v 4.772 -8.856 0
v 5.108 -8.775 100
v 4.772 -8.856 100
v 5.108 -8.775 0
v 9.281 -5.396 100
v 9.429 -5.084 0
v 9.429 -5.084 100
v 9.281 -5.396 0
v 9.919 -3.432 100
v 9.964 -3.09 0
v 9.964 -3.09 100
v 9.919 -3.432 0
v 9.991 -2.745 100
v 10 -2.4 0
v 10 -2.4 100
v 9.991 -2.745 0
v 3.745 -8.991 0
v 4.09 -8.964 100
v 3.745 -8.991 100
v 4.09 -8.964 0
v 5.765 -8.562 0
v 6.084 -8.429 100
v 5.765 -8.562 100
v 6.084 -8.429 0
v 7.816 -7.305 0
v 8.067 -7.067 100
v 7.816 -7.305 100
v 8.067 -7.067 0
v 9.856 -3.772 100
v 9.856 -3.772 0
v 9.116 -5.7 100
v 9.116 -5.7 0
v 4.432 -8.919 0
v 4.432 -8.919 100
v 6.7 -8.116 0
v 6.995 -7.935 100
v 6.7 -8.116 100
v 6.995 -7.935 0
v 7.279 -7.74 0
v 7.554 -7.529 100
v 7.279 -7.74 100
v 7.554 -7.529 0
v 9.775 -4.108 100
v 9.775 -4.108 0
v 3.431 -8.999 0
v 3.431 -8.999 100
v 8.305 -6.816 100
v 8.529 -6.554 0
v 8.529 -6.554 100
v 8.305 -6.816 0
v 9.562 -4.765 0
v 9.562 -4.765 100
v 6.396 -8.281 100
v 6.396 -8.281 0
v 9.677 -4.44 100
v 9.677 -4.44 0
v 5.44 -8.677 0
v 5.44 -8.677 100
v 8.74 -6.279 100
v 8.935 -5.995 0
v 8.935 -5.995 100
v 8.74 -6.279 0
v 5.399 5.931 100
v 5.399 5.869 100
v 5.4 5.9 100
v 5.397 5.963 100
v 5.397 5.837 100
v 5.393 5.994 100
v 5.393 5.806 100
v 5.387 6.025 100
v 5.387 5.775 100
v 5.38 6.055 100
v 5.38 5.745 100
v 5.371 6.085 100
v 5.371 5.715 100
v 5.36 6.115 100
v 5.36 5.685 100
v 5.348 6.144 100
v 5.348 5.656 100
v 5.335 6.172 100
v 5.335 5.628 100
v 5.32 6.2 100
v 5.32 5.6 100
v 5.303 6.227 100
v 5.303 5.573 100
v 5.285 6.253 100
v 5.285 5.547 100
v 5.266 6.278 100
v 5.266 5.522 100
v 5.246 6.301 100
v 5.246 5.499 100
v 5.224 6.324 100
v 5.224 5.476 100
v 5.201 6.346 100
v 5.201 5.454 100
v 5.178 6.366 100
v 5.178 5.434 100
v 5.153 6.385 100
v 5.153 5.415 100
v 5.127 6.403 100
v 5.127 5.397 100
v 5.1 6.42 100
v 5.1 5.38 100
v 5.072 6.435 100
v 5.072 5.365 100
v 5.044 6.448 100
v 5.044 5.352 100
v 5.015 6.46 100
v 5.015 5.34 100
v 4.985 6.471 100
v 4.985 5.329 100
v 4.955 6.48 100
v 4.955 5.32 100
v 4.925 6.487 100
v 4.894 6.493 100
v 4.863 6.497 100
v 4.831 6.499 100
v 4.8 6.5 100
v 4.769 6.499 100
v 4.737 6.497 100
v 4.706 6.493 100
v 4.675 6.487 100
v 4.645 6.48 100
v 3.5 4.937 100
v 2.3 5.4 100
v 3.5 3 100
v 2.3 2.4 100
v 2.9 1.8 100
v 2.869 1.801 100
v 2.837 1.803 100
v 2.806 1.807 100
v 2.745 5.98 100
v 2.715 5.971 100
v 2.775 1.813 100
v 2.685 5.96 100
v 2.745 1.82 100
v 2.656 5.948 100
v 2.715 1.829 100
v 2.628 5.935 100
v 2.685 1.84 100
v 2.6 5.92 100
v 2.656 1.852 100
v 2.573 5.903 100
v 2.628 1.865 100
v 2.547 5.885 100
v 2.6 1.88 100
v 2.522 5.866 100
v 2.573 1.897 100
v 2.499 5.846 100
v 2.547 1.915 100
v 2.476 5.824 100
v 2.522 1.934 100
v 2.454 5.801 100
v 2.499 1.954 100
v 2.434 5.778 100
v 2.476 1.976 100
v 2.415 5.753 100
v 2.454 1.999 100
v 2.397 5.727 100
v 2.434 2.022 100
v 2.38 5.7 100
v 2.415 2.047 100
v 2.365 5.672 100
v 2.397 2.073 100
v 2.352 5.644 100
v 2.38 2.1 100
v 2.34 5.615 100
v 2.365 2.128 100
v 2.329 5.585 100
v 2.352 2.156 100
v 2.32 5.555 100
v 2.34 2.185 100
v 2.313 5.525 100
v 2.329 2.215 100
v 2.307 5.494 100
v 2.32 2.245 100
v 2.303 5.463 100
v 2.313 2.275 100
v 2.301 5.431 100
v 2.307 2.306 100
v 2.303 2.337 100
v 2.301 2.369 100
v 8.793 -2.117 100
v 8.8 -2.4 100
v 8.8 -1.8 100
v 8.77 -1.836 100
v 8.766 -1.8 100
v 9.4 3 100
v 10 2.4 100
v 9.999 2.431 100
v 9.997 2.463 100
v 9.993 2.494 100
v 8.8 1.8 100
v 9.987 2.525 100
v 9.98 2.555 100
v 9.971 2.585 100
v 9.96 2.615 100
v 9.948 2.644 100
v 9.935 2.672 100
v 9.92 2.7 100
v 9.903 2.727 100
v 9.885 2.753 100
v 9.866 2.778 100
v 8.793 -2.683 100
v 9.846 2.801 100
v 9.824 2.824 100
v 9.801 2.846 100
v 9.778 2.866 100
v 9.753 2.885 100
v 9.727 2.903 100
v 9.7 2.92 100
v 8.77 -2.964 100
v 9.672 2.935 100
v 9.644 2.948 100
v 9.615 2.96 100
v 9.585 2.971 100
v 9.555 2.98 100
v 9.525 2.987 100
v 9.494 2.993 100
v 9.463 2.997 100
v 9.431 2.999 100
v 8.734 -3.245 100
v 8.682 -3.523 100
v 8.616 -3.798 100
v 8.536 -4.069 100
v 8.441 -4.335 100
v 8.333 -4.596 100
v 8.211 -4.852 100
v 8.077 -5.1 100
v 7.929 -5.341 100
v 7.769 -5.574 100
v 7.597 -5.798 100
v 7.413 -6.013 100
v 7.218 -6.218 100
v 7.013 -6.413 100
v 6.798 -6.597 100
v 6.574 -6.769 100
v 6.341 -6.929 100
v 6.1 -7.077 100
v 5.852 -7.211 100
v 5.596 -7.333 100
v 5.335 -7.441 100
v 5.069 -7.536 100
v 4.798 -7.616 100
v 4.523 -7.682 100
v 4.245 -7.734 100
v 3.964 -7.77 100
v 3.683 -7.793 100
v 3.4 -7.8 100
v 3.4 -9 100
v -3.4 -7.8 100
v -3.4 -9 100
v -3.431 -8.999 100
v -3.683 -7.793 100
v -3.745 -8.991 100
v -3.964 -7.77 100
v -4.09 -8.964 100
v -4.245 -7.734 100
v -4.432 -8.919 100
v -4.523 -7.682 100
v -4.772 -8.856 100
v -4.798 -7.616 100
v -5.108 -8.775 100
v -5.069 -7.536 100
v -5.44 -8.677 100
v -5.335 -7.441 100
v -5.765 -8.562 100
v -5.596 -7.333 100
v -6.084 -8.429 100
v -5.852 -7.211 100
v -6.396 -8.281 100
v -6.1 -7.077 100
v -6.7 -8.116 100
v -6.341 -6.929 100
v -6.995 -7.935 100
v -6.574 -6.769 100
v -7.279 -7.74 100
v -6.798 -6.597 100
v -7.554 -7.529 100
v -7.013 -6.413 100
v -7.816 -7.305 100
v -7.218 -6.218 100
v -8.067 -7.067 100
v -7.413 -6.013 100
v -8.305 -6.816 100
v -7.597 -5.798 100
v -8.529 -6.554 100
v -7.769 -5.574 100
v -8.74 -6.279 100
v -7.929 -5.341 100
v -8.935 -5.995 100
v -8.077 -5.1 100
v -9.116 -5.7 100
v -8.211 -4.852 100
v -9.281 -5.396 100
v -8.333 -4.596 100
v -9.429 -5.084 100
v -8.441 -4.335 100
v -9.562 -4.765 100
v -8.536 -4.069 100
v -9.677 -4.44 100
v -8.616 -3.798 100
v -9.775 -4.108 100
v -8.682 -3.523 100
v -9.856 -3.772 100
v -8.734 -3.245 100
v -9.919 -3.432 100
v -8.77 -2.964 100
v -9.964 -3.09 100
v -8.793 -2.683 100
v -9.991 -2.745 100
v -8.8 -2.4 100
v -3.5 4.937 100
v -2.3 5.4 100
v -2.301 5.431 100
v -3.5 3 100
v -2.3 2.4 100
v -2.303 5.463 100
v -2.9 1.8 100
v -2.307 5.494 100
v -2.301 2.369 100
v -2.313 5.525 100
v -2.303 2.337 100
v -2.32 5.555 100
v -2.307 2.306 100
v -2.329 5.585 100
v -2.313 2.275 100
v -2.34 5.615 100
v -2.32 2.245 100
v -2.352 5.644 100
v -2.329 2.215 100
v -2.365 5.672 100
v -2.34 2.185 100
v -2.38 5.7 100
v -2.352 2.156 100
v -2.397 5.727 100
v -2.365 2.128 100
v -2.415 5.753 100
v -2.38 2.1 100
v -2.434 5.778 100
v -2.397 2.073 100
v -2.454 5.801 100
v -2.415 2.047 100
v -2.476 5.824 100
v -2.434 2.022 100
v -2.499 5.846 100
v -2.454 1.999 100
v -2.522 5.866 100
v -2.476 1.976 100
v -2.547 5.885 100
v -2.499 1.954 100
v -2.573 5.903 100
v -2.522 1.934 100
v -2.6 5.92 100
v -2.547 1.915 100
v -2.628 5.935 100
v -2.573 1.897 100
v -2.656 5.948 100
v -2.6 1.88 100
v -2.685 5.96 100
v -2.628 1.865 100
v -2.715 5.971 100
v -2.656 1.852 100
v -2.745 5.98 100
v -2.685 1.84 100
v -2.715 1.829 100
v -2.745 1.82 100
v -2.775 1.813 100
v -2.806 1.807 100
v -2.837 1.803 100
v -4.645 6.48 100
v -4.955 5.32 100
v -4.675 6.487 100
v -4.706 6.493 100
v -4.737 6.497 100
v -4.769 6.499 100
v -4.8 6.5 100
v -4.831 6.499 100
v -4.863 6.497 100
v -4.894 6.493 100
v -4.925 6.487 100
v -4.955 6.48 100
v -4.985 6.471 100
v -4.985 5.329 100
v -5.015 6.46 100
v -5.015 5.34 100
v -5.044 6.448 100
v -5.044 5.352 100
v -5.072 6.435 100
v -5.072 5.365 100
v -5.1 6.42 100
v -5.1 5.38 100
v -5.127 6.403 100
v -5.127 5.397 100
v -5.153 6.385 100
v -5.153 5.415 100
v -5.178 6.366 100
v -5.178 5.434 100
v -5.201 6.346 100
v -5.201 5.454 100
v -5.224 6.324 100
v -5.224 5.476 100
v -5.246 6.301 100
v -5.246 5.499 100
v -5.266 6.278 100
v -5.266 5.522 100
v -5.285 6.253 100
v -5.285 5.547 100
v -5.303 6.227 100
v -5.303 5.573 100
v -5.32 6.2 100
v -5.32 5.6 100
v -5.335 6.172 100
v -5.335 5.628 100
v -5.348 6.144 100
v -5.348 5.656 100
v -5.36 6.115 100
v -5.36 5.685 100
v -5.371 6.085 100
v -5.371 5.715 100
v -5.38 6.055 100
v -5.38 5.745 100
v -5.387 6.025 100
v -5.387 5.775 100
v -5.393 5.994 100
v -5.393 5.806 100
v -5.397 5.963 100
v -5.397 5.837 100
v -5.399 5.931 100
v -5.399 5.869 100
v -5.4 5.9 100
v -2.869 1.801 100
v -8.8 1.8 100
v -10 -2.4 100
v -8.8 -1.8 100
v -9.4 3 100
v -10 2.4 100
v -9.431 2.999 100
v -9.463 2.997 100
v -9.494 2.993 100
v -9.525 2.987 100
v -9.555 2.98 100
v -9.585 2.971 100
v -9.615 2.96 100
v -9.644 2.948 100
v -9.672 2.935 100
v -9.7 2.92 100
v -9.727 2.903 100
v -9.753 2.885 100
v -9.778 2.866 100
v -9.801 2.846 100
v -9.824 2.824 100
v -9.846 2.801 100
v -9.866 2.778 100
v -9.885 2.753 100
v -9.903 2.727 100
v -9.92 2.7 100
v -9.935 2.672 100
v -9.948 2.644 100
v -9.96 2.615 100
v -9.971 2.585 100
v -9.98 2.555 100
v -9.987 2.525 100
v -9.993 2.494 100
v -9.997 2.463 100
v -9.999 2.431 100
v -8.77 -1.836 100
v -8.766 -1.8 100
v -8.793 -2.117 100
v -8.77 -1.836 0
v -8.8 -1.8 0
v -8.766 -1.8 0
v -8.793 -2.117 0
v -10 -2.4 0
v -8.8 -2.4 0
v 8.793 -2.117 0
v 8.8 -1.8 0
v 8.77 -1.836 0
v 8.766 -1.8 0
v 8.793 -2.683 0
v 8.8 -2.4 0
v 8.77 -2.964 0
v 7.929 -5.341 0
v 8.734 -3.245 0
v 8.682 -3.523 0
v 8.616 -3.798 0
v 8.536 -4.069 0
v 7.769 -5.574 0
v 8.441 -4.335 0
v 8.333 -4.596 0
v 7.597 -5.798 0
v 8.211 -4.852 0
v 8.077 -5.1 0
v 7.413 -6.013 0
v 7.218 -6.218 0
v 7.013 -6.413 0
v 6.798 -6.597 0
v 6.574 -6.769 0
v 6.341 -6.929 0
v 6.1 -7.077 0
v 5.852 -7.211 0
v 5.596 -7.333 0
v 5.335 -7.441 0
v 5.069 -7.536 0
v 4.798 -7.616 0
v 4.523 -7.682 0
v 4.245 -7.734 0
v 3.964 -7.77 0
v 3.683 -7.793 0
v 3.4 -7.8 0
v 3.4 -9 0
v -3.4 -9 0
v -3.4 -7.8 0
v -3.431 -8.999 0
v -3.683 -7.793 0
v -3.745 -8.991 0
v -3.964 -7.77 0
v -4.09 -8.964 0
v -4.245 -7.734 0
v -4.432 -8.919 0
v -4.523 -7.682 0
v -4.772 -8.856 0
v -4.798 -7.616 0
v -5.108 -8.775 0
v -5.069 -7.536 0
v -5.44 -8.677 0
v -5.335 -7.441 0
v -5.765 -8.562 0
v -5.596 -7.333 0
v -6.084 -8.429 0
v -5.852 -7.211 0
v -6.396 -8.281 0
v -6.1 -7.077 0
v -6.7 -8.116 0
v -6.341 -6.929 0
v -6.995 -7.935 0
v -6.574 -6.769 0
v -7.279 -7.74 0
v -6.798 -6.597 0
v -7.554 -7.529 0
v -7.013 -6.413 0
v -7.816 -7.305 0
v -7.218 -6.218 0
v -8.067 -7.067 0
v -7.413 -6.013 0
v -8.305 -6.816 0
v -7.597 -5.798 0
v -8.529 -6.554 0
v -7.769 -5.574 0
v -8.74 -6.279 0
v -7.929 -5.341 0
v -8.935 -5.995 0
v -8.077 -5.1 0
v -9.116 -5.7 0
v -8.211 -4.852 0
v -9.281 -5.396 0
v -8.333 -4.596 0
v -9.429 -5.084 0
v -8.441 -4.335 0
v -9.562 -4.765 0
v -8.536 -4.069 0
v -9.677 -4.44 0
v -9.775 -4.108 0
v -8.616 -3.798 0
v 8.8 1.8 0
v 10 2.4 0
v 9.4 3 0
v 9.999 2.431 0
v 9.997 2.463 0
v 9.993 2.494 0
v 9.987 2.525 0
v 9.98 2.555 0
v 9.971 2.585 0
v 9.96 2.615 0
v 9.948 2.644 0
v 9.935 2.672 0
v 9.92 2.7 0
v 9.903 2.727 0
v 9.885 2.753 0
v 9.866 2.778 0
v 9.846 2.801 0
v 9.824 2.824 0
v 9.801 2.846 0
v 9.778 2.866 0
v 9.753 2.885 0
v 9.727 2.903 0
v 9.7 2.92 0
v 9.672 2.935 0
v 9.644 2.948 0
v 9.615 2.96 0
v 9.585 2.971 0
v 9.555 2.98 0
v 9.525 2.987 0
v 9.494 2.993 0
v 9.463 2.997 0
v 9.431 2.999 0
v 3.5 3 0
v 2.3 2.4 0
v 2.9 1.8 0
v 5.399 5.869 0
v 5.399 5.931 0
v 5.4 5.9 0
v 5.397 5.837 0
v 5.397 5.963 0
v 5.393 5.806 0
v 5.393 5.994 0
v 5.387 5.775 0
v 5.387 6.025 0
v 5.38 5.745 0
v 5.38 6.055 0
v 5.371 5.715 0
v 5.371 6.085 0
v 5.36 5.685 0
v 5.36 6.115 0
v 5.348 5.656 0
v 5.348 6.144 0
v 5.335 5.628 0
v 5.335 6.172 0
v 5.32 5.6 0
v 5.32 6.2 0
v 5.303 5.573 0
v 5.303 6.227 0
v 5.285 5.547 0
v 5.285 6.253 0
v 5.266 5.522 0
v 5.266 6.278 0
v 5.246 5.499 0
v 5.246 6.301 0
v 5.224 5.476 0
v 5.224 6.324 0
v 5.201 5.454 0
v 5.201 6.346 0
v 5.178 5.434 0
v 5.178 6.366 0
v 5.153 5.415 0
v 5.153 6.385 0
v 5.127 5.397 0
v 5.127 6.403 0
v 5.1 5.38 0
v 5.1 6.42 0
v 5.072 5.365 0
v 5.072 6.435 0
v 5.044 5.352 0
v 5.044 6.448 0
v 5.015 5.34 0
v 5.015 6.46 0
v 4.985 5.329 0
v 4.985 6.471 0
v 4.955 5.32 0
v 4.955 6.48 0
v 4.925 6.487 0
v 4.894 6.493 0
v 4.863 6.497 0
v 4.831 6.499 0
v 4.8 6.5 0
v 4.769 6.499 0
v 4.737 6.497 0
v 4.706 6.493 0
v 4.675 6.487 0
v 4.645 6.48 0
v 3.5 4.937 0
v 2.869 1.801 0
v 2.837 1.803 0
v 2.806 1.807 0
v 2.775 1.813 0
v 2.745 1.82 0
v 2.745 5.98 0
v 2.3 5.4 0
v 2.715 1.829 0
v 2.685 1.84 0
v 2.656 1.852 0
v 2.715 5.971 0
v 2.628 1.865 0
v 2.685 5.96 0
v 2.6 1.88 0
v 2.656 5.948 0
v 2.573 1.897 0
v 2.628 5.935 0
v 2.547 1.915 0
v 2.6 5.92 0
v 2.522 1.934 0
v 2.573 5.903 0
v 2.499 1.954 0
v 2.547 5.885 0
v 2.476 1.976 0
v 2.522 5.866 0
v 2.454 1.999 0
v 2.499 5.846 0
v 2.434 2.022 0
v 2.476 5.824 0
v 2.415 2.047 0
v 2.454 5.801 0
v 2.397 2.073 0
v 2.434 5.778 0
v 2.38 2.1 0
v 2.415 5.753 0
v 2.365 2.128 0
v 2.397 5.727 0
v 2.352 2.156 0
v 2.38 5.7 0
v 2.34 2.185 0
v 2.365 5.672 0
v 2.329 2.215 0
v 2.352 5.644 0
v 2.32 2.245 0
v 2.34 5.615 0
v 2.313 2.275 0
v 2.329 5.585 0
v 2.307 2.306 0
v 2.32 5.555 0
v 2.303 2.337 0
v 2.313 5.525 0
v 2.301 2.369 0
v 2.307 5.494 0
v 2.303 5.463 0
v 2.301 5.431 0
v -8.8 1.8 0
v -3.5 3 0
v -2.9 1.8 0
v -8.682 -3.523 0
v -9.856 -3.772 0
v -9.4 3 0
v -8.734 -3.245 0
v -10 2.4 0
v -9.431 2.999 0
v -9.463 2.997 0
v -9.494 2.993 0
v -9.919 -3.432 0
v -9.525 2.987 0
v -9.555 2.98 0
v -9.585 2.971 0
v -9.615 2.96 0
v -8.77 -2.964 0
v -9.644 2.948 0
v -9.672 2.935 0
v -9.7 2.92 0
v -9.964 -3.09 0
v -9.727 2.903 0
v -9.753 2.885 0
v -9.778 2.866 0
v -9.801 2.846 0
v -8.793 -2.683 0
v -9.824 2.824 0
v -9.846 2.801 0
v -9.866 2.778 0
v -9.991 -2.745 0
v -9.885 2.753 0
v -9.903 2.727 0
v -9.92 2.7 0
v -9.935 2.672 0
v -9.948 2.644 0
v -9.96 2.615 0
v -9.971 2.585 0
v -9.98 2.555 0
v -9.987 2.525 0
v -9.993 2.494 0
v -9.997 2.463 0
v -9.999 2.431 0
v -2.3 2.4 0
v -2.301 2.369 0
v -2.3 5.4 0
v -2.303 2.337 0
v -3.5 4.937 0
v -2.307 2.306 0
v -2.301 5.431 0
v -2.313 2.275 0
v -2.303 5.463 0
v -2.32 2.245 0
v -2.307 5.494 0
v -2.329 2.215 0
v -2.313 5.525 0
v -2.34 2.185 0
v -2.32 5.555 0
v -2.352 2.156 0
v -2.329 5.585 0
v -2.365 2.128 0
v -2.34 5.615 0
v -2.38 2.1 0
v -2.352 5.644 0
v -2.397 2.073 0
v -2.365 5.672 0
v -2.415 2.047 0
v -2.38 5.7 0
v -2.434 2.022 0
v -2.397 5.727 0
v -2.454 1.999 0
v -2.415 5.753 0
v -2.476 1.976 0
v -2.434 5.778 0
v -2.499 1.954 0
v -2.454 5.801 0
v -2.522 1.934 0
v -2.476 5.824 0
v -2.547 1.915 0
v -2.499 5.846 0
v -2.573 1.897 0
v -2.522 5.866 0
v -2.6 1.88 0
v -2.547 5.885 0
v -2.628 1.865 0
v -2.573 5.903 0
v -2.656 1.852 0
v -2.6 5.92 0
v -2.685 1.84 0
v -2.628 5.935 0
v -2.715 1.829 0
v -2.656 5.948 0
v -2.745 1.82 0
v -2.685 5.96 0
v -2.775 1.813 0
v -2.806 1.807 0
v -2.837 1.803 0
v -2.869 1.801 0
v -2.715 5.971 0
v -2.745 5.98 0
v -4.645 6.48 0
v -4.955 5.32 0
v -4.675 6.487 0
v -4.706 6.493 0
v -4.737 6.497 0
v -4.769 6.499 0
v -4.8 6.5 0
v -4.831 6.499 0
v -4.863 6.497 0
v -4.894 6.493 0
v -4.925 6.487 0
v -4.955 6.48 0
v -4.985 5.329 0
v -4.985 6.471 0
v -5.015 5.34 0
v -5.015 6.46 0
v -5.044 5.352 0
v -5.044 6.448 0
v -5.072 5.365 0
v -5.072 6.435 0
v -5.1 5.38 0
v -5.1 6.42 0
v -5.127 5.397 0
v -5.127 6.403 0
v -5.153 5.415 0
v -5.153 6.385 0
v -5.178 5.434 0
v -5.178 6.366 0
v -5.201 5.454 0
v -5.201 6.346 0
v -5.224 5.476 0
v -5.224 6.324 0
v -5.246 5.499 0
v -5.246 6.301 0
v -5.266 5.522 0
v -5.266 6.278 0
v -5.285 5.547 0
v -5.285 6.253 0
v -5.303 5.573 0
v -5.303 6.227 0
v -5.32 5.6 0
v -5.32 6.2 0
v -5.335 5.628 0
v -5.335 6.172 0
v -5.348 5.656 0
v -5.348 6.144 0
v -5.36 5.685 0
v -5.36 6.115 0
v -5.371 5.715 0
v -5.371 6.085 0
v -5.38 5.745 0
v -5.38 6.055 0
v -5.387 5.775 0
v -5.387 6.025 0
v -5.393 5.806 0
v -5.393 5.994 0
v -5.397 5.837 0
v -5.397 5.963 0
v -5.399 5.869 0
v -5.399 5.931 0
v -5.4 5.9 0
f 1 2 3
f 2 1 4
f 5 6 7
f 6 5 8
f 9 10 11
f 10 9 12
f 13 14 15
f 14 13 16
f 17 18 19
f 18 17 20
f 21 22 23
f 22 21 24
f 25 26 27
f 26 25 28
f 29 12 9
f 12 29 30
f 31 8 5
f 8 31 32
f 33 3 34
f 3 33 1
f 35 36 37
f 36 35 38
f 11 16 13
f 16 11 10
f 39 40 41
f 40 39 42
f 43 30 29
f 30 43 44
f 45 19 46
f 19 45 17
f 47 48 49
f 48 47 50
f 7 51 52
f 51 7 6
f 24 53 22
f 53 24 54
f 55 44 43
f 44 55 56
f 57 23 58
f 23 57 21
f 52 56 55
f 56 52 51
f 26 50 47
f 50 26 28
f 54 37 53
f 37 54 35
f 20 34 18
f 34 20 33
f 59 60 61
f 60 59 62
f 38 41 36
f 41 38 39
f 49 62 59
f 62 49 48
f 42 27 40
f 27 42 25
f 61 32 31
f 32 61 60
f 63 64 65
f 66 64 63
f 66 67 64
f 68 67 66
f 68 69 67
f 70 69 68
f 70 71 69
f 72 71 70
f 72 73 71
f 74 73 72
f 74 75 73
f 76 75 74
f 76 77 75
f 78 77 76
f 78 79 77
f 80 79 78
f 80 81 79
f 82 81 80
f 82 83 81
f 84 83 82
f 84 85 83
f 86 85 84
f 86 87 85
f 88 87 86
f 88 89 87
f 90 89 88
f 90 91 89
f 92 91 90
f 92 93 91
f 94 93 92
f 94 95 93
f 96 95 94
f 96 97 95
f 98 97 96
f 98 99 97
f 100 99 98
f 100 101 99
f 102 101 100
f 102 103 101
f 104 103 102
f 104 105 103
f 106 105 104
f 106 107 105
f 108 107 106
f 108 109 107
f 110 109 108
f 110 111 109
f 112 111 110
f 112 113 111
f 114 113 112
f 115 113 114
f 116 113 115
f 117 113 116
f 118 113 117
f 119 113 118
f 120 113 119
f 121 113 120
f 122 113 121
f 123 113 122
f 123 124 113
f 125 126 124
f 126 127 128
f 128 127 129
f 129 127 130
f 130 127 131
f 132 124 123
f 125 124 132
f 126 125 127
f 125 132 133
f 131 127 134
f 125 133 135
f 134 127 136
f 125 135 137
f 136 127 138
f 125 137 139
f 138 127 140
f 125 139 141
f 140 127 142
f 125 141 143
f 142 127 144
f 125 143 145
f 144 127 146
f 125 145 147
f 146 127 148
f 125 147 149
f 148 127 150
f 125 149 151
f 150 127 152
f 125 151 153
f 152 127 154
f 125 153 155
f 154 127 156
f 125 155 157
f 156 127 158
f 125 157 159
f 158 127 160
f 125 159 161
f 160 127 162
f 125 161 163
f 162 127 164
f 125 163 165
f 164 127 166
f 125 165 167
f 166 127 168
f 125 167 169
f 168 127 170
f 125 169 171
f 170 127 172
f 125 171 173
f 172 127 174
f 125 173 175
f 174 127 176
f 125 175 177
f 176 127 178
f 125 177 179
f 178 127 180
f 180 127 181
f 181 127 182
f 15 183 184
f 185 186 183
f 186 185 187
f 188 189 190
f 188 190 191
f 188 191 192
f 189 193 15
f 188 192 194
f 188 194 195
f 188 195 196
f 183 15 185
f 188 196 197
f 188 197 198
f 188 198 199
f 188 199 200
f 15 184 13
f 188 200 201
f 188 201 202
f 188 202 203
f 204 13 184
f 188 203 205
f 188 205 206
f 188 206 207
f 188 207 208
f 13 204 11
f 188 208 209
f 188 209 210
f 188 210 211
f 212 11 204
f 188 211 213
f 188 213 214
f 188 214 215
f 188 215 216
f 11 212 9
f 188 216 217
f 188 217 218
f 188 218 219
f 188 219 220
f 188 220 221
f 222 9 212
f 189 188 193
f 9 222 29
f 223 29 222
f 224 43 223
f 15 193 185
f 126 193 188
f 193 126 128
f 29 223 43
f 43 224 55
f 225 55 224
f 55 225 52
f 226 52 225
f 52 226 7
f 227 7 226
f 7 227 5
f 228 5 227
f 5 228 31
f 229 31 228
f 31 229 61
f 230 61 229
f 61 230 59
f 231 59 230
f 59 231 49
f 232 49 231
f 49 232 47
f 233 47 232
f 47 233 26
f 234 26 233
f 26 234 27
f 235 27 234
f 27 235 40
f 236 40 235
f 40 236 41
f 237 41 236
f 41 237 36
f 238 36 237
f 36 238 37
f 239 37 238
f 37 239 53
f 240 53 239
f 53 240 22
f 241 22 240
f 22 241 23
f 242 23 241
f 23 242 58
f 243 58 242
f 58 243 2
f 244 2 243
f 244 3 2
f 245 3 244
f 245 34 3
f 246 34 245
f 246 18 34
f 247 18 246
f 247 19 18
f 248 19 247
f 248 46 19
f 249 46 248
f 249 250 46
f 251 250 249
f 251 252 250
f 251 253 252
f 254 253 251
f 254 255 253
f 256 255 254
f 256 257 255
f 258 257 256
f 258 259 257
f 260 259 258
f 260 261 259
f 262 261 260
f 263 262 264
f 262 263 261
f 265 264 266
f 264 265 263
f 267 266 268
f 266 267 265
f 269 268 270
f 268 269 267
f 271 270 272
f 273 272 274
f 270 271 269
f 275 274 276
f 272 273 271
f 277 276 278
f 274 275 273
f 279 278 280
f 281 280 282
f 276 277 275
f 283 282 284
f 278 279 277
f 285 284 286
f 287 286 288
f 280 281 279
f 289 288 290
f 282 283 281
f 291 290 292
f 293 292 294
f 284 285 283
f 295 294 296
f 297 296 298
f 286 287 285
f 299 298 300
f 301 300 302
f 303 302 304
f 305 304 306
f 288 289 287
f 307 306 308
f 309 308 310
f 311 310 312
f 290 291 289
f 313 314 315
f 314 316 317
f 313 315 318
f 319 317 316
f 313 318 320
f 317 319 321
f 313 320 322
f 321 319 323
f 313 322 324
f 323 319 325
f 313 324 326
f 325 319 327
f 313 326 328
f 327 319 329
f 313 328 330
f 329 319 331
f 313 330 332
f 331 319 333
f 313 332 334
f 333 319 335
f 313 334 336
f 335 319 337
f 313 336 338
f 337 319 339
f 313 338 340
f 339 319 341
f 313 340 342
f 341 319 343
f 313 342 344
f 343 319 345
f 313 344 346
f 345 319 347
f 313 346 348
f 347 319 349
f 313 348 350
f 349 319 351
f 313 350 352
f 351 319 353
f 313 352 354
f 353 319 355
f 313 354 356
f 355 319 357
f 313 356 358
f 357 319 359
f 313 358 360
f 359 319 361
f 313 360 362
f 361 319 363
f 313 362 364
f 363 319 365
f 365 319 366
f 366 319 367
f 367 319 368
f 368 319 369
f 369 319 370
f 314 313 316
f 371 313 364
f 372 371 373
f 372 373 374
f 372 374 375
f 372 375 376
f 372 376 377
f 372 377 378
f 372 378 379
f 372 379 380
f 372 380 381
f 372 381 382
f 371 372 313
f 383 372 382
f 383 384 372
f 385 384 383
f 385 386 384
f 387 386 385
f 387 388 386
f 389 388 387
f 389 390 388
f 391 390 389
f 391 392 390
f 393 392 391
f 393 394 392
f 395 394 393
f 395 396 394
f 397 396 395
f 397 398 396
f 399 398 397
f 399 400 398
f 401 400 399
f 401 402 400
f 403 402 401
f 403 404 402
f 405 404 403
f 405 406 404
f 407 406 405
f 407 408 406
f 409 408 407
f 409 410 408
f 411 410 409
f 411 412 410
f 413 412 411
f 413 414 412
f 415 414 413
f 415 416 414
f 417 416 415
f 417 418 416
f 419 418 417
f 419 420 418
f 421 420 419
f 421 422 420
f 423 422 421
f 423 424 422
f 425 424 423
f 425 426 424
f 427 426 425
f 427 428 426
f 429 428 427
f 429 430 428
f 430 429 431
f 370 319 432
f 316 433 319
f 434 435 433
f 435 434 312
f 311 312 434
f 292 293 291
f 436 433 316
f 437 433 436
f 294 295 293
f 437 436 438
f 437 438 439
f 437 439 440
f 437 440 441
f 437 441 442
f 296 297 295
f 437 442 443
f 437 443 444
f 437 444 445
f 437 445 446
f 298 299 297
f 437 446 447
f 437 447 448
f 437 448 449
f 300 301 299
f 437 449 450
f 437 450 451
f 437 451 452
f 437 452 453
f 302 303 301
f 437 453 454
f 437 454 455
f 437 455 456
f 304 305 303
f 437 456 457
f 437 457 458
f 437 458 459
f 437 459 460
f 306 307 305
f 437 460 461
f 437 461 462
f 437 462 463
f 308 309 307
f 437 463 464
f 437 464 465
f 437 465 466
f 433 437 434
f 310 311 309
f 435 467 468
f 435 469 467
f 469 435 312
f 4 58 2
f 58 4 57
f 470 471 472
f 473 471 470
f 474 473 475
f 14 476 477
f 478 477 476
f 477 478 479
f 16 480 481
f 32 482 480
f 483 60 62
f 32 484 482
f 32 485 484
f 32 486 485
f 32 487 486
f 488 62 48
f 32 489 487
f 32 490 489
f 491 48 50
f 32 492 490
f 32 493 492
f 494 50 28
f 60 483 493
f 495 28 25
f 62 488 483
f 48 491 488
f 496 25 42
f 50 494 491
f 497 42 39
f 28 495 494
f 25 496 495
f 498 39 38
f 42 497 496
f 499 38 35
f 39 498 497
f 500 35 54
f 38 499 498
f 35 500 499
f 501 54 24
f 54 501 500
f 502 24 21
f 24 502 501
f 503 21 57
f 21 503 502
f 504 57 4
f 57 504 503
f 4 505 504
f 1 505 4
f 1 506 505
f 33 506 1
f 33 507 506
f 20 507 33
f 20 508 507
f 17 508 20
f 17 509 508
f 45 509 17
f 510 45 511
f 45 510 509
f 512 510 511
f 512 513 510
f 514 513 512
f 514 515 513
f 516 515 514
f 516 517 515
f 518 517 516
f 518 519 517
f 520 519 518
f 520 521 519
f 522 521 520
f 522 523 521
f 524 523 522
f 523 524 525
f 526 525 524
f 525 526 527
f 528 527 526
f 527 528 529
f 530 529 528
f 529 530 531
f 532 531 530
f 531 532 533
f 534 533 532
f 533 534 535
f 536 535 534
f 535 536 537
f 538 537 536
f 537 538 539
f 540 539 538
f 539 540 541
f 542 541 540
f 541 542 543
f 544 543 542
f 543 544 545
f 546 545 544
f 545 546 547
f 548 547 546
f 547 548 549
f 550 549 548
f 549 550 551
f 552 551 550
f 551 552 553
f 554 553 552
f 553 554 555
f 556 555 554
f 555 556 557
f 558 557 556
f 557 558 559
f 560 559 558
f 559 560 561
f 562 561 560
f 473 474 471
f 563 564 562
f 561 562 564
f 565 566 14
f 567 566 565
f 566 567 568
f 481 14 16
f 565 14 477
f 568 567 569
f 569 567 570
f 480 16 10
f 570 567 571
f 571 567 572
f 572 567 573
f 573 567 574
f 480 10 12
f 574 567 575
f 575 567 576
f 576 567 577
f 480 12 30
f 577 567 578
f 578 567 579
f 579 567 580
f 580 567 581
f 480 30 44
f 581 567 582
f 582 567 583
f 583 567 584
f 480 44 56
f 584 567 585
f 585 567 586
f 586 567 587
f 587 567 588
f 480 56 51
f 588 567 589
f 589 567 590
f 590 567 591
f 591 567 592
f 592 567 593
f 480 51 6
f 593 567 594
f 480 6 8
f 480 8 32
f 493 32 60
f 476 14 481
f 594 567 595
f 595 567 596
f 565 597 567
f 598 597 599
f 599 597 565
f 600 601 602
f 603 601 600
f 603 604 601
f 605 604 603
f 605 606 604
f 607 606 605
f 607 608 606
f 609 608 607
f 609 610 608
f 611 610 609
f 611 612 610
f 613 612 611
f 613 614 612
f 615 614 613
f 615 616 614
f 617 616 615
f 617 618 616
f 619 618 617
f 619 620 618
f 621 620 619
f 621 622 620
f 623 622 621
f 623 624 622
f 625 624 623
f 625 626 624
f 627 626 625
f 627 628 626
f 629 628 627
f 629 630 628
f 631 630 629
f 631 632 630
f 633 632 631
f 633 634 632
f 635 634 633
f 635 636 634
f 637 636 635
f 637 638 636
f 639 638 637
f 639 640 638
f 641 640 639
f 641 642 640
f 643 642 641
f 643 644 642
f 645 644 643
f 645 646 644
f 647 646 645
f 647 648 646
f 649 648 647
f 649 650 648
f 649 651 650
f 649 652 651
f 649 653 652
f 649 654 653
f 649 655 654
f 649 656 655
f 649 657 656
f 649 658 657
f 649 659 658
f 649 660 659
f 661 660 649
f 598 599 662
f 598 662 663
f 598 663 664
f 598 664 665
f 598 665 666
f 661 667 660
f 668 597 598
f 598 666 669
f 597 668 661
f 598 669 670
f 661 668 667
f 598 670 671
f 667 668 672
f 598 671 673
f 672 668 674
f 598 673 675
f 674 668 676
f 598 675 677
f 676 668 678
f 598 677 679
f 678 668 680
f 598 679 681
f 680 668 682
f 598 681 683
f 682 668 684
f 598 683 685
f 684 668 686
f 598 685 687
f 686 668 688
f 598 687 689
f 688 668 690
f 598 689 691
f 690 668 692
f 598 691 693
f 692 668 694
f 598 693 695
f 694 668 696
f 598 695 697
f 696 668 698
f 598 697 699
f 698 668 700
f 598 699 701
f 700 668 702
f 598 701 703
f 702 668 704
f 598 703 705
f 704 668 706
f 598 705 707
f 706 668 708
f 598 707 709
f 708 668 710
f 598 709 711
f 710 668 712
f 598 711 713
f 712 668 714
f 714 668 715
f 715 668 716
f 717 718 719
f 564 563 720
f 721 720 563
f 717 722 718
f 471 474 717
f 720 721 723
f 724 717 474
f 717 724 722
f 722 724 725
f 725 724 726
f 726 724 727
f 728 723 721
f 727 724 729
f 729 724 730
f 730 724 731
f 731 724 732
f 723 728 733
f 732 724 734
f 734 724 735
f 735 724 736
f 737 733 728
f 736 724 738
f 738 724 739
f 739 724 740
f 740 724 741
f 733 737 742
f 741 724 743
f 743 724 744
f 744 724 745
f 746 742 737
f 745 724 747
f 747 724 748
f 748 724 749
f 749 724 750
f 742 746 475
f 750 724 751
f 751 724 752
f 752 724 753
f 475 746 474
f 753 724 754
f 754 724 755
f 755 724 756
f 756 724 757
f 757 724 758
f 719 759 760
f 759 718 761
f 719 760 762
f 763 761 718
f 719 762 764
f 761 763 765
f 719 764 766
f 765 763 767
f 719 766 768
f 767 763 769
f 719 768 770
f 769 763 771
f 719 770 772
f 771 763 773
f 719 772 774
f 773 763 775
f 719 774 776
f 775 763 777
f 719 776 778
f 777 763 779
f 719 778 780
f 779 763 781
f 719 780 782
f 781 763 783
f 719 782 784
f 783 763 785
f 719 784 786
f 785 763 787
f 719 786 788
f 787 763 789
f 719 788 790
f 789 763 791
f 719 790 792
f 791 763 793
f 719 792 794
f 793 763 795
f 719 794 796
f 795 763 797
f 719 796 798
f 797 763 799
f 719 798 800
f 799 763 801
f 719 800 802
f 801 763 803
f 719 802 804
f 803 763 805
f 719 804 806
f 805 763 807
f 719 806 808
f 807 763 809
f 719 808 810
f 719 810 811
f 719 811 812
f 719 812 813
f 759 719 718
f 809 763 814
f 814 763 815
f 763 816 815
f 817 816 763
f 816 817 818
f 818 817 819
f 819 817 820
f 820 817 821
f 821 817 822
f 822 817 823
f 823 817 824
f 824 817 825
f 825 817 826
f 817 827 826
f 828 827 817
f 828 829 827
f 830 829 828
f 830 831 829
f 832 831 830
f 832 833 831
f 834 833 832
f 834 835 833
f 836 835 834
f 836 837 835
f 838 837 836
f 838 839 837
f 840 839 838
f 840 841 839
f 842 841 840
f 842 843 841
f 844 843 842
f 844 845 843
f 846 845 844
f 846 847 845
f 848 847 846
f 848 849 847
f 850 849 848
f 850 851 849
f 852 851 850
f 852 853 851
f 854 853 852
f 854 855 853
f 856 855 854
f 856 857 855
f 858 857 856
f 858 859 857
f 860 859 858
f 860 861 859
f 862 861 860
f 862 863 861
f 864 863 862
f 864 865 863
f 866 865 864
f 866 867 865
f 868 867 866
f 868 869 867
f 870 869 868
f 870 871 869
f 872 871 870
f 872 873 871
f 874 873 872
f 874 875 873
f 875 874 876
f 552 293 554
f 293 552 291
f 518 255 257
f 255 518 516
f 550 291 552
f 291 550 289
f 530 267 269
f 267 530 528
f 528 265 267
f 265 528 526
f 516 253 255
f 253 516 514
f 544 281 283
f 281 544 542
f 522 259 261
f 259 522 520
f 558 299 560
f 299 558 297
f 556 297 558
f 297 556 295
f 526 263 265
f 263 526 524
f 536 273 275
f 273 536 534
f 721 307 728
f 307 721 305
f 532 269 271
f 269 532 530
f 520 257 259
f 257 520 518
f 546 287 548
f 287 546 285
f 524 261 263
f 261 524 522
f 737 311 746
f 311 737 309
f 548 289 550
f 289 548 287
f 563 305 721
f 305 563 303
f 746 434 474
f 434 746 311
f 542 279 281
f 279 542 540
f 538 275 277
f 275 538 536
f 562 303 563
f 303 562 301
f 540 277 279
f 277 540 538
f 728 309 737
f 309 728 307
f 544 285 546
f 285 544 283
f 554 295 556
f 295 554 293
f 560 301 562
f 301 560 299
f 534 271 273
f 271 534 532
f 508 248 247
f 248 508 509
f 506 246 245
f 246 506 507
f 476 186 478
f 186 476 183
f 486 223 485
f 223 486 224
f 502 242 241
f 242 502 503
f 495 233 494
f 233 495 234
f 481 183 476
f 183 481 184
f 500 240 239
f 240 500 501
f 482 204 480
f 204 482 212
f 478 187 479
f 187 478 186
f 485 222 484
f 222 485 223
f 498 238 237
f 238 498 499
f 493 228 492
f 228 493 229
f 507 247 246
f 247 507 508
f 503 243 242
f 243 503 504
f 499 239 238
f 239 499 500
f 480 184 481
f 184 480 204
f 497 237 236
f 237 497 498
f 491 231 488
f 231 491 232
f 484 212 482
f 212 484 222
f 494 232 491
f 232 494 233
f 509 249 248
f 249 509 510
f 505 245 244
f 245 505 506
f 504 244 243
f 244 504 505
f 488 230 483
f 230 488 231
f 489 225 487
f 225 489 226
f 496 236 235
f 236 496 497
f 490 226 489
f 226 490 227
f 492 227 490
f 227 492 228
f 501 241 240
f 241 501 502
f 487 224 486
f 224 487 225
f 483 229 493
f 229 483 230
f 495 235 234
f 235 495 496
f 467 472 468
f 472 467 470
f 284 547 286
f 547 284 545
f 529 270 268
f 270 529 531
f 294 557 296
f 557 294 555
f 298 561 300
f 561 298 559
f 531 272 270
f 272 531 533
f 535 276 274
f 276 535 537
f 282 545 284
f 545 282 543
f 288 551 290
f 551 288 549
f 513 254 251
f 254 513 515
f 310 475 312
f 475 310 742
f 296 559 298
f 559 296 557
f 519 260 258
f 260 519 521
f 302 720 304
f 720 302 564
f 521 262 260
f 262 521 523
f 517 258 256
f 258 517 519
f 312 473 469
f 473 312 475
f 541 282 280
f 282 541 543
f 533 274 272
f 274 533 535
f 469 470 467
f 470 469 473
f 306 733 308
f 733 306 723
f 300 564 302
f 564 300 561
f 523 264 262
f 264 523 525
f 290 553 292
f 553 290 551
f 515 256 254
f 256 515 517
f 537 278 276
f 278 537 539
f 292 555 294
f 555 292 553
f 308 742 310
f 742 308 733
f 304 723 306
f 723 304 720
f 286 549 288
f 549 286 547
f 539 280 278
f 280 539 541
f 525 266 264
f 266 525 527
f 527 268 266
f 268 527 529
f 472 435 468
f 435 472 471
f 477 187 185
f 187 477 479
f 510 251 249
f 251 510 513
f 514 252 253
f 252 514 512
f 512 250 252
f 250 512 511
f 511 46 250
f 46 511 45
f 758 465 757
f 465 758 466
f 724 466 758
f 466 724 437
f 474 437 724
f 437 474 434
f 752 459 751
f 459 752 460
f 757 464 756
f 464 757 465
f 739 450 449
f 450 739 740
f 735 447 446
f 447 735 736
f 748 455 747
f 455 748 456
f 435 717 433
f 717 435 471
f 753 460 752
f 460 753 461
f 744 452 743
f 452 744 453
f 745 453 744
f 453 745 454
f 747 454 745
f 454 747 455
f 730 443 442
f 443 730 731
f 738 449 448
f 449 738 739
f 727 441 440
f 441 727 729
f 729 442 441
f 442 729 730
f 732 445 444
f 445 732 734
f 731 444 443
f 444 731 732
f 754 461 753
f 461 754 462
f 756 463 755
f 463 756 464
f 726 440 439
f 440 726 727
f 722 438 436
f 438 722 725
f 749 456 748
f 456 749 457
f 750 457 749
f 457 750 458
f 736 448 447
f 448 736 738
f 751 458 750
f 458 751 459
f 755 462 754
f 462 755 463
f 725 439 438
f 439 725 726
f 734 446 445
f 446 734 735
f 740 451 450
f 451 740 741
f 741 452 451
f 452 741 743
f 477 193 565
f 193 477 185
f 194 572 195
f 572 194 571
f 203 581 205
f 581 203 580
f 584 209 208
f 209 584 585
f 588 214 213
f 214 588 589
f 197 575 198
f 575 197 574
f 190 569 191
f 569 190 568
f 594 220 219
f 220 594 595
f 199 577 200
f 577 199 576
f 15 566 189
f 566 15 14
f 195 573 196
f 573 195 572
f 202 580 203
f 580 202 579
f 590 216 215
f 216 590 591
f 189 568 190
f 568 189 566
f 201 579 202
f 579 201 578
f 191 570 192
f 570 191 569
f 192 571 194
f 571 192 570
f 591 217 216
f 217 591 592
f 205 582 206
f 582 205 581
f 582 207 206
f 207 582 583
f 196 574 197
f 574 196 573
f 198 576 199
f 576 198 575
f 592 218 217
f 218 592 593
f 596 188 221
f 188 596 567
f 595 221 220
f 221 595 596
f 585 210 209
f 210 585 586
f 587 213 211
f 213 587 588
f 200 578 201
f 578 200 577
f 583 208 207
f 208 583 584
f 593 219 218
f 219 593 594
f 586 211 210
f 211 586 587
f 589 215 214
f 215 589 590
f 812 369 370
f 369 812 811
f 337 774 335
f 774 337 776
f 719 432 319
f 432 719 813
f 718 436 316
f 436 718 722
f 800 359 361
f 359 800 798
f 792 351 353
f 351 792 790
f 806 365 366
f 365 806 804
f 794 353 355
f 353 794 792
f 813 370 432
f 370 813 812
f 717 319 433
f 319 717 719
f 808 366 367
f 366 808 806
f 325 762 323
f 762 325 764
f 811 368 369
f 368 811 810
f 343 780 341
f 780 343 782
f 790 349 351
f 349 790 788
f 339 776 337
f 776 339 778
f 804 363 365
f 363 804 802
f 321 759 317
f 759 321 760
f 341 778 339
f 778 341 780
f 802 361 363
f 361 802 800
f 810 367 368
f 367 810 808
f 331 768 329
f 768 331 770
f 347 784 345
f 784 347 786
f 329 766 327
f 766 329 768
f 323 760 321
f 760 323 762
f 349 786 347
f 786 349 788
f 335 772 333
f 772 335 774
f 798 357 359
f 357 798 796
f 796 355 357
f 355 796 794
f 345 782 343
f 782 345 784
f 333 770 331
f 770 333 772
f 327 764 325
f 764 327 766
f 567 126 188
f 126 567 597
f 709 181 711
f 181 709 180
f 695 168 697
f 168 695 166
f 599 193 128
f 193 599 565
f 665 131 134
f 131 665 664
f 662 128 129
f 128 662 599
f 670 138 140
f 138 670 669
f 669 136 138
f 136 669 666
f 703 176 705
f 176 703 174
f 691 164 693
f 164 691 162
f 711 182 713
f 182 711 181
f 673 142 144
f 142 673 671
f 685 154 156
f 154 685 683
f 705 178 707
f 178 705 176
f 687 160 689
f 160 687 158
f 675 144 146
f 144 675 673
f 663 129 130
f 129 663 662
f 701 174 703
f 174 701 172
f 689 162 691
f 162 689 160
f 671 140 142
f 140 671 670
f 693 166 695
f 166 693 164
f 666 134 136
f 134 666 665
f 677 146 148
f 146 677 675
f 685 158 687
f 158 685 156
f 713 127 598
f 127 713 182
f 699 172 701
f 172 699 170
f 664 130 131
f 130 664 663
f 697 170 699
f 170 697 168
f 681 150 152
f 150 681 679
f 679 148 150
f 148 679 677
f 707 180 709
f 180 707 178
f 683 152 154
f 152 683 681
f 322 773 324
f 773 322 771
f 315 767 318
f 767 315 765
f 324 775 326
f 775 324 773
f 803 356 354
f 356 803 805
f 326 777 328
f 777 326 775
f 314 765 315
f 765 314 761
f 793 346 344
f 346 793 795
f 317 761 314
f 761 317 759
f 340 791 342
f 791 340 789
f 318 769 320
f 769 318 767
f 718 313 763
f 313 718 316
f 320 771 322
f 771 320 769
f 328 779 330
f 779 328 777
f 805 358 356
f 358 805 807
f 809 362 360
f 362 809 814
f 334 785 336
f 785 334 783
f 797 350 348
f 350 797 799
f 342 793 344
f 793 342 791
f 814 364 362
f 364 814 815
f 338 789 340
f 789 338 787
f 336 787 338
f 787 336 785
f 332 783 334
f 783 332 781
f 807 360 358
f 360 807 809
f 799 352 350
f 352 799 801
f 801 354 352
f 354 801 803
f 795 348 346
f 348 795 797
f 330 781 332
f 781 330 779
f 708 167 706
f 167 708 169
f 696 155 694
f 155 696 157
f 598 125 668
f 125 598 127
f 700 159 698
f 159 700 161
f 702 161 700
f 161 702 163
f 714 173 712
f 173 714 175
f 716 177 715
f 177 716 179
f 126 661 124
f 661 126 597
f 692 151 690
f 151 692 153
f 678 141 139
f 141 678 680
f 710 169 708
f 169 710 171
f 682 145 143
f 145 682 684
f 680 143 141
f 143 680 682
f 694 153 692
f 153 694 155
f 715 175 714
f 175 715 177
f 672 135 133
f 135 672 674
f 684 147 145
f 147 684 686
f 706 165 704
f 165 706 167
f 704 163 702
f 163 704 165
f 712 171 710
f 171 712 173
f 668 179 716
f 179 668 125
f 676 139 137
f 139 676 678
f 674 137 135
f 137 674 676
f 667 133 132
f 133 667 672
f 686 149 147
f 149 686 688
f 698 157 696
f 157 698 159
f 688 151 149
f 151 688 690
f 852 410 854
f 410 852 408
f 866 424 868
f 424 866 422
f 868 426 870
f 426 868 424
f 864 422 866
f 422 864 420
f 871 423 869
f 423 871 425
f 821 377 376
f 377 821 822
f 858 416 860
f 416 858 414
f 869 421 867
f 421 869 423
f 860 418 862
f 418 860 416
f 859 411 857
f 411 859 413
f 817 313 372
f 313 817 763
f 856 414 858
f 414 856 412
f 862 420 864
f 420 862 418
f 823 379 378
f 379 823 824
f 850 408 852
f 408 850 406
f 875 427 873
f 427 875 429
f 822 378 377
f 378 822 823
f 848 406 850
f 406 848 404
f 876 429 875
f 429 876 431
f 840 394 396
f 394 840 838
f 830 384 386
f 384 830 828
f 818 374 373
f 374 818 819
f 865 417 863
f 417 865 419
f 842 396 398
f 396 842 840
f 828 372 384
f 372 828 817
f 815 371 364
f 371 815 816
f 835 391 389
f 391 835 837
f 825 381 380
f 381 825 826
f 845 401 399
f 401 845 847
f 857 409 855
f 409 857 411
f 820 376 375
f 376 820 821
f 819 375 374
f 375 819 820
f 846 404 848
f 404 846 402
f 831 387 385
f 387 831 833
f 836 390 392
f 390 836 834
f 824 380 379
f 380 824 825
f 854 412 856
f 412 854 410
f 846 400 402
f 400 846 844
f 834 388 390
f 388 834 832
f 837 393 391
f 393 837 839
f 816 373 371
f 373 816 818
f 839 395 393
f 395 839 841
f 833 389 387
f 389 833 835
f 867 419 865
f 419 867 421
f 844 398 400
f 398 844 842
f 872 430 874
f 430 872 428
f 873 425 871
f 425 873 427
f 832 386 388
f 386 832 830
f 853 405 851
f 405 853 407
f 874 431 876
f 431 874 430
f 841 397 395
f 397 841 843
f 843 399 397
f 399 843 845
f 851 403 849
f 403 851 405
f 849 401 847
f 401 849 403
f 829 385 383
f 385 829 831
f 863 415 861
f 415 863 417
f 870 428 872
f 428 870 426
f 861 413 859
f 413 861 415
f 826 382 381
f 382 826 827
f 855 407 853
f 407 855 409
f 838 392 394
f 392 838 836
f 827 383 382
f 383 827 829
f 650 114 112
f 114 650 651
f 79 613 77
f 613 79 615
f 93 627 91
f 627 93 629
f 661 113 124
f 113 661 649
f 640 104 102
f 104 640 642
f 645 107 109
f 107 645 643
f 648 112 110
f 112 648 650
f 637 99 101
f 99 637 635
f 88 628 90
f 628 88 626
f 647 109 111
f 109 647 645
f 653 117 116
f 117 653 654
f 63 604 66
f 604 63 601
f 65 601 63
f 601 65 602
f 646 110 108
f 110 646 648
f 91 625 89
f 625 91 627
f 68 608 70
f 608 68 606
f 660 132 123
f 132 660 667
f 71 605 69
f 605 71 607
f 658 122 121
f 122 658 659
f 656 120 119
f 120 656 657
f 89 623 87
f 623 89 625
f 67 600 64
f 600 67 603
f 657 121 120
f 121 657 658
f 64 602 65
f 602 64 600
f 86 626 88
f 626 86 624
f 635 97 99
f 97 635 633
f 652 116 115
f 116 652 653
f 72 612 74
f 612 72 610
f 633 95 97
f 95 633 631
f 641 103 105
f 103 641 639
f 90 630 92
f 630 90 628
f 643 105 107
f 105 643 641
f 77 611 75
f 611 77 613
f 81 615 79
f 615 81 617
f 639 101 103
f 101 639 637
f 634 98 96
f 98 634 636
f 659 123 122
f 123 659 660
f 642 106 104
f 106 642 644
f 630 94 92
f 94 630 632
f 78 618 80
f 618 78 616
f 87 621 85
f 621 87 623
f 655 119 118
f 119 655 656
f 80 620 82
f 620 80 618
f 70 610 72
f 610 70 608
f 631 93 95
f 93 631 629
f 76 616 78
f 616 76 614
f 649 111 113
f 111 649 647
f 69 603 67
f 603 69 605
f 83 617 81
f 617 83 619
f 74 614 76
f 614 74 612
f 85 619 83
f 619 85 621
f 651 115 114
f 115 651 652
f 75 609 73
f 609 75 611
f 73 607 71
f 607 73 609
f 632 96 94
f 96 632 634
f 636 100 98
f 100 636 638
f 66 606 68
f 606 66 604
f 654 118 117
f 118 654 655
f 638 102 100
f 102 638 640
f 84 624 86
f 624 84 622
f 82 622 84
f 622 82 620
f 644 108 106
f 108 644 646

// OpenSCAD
$fn=120;

AnzX=1; // Anzahl Spalten - Number of columns
AnzY=1; // Anzahl Zeilen - Number of lines

KL=100; // Kanallaenge - Channel length
KH=12; // Kanalhoehe  - Channel height
PB=20; // Profilbreite - Profile width
RD=6; // Rundung - Rounding
Nut=6; // Nut-Weite - Slot width
ND=3; // Nut-Dicke - Groove thickness
WS=1.2; //Wandstaerke - 

module DoIt()
{
    S=Nut+1.0;
    difference()
    {  
        union()
        {
            translate([PB/2-RD-WS/2,RD+WS/2,0]) cylinder(h=KL,d=RD*2+WS,center=false);
            translate([-PB/2+RD+WS/2,RD+WS/2,0]) cylinder(h=KL,d=RD*2+WS,center=false);
        }
        union()
        { 
            translate([PB/2-RD-WS/2,RD+WS/2,-1]) cylinder(h=KL+2,d=RD*2-WS,center=false);
            translate([-PB/2+RD+WS/2,RD+WS/2,-1]) cylinder(h=KL+2,d=RD*2-WS,center=false);
            translate([-PB/2+RD+WS/2,WS,-1]) cube([PB-RD*2-WS,RD,KL+2],center=false); 
            translate([-PB/2,WS+RD,-1]) cube([PB,RD,KL+2],center=false); 
        }
    }
    hull()
    {
        translate([-PB/2+RD+WS/2,WS/2,0]) cylinder(h=KL,d=WS,center=false);  
        translate([PB/2-RD-WS/2,WS/2,0]) cylinder(h=KL,d=WS,center=false);  
    }           
    hull()
    {
        translate([-PB/2+WS/2,RD+WS/2,0]) cylinder(h=KL,d=WS,center=false);  
        translate([-PB/2+WS/2,KH-WS/2,0]) cylinder(h=KL,d=WS,center=false);  
    }           
    hull()
    {
        translate([PB/2-WS/2,RD+WS/2,0]) cylinder(h=KL,d=WS,center=false);  
        translate([PB/2-WS/2,KH-WS/2,0]) cylinder(h=KL,d=WS,center=false);  
    } 
    hull()
    {
        translate([-PB/2+WS/2,KH-WS/2,0]) cylinder(h=KL,d=WS,center=false);  
        translate([-S/2+WS/2,KH-WS/2,0]) cylinder(h=KL,d=WS,center=false);  
    }           
    hull()
    {
        translate([PB/2-WS/2,KH-WS/2,0]) cylinder(h=KL,d=WS,center=false);  
        translate([S/2-WS/2,KH-WS/2,0]) cylinder(h=KL,d=WS,center=false);  
    } 
    hull()
    {
        translate([-S/2+WS/2,KH-WS/2,0]) cylinder(h=KL,d=WS,center=false);  
        translate([-S/2+WS/2,KH+ND-WS/2,0]) cylinder(h=KL,d=WS,center=false);  
    }           
    hull()
    {
        translate([S/2-WS/2,KH-WS/2,0]) cylinder(h=KL,d=WS,center=false);  
        translate([S/2-WS/2,KH+ND-WS/2,0]) cylinder(h=KL,d=WS,center=false);  
    } 
    hull()
    {
        translate([-S/2+WS/2,KH+ND-WS/2,0]) cylinder(h=KL,d=WS,center=false);  
        translate([-Nut+WS,KH+ND-WS/2+0.5,0]) cylinder(h=KL,d=WS,center=false);  
    }           
    hull()
    {
        translate([S/2-WS/2,KH+ND-WS/2,0]) cylinder(h=KL,d=WS,center=false);  
        translate([Nut-WS,KH+ND-WS/2+0.5,0]) cylinder(h=KL,d=WS,center=false);  
    } 
}

for (i=[0:AnzX-1]) for (k=[0:AnzY-1]) translate([i*35,k*35-9,0]) DoIt(); 
